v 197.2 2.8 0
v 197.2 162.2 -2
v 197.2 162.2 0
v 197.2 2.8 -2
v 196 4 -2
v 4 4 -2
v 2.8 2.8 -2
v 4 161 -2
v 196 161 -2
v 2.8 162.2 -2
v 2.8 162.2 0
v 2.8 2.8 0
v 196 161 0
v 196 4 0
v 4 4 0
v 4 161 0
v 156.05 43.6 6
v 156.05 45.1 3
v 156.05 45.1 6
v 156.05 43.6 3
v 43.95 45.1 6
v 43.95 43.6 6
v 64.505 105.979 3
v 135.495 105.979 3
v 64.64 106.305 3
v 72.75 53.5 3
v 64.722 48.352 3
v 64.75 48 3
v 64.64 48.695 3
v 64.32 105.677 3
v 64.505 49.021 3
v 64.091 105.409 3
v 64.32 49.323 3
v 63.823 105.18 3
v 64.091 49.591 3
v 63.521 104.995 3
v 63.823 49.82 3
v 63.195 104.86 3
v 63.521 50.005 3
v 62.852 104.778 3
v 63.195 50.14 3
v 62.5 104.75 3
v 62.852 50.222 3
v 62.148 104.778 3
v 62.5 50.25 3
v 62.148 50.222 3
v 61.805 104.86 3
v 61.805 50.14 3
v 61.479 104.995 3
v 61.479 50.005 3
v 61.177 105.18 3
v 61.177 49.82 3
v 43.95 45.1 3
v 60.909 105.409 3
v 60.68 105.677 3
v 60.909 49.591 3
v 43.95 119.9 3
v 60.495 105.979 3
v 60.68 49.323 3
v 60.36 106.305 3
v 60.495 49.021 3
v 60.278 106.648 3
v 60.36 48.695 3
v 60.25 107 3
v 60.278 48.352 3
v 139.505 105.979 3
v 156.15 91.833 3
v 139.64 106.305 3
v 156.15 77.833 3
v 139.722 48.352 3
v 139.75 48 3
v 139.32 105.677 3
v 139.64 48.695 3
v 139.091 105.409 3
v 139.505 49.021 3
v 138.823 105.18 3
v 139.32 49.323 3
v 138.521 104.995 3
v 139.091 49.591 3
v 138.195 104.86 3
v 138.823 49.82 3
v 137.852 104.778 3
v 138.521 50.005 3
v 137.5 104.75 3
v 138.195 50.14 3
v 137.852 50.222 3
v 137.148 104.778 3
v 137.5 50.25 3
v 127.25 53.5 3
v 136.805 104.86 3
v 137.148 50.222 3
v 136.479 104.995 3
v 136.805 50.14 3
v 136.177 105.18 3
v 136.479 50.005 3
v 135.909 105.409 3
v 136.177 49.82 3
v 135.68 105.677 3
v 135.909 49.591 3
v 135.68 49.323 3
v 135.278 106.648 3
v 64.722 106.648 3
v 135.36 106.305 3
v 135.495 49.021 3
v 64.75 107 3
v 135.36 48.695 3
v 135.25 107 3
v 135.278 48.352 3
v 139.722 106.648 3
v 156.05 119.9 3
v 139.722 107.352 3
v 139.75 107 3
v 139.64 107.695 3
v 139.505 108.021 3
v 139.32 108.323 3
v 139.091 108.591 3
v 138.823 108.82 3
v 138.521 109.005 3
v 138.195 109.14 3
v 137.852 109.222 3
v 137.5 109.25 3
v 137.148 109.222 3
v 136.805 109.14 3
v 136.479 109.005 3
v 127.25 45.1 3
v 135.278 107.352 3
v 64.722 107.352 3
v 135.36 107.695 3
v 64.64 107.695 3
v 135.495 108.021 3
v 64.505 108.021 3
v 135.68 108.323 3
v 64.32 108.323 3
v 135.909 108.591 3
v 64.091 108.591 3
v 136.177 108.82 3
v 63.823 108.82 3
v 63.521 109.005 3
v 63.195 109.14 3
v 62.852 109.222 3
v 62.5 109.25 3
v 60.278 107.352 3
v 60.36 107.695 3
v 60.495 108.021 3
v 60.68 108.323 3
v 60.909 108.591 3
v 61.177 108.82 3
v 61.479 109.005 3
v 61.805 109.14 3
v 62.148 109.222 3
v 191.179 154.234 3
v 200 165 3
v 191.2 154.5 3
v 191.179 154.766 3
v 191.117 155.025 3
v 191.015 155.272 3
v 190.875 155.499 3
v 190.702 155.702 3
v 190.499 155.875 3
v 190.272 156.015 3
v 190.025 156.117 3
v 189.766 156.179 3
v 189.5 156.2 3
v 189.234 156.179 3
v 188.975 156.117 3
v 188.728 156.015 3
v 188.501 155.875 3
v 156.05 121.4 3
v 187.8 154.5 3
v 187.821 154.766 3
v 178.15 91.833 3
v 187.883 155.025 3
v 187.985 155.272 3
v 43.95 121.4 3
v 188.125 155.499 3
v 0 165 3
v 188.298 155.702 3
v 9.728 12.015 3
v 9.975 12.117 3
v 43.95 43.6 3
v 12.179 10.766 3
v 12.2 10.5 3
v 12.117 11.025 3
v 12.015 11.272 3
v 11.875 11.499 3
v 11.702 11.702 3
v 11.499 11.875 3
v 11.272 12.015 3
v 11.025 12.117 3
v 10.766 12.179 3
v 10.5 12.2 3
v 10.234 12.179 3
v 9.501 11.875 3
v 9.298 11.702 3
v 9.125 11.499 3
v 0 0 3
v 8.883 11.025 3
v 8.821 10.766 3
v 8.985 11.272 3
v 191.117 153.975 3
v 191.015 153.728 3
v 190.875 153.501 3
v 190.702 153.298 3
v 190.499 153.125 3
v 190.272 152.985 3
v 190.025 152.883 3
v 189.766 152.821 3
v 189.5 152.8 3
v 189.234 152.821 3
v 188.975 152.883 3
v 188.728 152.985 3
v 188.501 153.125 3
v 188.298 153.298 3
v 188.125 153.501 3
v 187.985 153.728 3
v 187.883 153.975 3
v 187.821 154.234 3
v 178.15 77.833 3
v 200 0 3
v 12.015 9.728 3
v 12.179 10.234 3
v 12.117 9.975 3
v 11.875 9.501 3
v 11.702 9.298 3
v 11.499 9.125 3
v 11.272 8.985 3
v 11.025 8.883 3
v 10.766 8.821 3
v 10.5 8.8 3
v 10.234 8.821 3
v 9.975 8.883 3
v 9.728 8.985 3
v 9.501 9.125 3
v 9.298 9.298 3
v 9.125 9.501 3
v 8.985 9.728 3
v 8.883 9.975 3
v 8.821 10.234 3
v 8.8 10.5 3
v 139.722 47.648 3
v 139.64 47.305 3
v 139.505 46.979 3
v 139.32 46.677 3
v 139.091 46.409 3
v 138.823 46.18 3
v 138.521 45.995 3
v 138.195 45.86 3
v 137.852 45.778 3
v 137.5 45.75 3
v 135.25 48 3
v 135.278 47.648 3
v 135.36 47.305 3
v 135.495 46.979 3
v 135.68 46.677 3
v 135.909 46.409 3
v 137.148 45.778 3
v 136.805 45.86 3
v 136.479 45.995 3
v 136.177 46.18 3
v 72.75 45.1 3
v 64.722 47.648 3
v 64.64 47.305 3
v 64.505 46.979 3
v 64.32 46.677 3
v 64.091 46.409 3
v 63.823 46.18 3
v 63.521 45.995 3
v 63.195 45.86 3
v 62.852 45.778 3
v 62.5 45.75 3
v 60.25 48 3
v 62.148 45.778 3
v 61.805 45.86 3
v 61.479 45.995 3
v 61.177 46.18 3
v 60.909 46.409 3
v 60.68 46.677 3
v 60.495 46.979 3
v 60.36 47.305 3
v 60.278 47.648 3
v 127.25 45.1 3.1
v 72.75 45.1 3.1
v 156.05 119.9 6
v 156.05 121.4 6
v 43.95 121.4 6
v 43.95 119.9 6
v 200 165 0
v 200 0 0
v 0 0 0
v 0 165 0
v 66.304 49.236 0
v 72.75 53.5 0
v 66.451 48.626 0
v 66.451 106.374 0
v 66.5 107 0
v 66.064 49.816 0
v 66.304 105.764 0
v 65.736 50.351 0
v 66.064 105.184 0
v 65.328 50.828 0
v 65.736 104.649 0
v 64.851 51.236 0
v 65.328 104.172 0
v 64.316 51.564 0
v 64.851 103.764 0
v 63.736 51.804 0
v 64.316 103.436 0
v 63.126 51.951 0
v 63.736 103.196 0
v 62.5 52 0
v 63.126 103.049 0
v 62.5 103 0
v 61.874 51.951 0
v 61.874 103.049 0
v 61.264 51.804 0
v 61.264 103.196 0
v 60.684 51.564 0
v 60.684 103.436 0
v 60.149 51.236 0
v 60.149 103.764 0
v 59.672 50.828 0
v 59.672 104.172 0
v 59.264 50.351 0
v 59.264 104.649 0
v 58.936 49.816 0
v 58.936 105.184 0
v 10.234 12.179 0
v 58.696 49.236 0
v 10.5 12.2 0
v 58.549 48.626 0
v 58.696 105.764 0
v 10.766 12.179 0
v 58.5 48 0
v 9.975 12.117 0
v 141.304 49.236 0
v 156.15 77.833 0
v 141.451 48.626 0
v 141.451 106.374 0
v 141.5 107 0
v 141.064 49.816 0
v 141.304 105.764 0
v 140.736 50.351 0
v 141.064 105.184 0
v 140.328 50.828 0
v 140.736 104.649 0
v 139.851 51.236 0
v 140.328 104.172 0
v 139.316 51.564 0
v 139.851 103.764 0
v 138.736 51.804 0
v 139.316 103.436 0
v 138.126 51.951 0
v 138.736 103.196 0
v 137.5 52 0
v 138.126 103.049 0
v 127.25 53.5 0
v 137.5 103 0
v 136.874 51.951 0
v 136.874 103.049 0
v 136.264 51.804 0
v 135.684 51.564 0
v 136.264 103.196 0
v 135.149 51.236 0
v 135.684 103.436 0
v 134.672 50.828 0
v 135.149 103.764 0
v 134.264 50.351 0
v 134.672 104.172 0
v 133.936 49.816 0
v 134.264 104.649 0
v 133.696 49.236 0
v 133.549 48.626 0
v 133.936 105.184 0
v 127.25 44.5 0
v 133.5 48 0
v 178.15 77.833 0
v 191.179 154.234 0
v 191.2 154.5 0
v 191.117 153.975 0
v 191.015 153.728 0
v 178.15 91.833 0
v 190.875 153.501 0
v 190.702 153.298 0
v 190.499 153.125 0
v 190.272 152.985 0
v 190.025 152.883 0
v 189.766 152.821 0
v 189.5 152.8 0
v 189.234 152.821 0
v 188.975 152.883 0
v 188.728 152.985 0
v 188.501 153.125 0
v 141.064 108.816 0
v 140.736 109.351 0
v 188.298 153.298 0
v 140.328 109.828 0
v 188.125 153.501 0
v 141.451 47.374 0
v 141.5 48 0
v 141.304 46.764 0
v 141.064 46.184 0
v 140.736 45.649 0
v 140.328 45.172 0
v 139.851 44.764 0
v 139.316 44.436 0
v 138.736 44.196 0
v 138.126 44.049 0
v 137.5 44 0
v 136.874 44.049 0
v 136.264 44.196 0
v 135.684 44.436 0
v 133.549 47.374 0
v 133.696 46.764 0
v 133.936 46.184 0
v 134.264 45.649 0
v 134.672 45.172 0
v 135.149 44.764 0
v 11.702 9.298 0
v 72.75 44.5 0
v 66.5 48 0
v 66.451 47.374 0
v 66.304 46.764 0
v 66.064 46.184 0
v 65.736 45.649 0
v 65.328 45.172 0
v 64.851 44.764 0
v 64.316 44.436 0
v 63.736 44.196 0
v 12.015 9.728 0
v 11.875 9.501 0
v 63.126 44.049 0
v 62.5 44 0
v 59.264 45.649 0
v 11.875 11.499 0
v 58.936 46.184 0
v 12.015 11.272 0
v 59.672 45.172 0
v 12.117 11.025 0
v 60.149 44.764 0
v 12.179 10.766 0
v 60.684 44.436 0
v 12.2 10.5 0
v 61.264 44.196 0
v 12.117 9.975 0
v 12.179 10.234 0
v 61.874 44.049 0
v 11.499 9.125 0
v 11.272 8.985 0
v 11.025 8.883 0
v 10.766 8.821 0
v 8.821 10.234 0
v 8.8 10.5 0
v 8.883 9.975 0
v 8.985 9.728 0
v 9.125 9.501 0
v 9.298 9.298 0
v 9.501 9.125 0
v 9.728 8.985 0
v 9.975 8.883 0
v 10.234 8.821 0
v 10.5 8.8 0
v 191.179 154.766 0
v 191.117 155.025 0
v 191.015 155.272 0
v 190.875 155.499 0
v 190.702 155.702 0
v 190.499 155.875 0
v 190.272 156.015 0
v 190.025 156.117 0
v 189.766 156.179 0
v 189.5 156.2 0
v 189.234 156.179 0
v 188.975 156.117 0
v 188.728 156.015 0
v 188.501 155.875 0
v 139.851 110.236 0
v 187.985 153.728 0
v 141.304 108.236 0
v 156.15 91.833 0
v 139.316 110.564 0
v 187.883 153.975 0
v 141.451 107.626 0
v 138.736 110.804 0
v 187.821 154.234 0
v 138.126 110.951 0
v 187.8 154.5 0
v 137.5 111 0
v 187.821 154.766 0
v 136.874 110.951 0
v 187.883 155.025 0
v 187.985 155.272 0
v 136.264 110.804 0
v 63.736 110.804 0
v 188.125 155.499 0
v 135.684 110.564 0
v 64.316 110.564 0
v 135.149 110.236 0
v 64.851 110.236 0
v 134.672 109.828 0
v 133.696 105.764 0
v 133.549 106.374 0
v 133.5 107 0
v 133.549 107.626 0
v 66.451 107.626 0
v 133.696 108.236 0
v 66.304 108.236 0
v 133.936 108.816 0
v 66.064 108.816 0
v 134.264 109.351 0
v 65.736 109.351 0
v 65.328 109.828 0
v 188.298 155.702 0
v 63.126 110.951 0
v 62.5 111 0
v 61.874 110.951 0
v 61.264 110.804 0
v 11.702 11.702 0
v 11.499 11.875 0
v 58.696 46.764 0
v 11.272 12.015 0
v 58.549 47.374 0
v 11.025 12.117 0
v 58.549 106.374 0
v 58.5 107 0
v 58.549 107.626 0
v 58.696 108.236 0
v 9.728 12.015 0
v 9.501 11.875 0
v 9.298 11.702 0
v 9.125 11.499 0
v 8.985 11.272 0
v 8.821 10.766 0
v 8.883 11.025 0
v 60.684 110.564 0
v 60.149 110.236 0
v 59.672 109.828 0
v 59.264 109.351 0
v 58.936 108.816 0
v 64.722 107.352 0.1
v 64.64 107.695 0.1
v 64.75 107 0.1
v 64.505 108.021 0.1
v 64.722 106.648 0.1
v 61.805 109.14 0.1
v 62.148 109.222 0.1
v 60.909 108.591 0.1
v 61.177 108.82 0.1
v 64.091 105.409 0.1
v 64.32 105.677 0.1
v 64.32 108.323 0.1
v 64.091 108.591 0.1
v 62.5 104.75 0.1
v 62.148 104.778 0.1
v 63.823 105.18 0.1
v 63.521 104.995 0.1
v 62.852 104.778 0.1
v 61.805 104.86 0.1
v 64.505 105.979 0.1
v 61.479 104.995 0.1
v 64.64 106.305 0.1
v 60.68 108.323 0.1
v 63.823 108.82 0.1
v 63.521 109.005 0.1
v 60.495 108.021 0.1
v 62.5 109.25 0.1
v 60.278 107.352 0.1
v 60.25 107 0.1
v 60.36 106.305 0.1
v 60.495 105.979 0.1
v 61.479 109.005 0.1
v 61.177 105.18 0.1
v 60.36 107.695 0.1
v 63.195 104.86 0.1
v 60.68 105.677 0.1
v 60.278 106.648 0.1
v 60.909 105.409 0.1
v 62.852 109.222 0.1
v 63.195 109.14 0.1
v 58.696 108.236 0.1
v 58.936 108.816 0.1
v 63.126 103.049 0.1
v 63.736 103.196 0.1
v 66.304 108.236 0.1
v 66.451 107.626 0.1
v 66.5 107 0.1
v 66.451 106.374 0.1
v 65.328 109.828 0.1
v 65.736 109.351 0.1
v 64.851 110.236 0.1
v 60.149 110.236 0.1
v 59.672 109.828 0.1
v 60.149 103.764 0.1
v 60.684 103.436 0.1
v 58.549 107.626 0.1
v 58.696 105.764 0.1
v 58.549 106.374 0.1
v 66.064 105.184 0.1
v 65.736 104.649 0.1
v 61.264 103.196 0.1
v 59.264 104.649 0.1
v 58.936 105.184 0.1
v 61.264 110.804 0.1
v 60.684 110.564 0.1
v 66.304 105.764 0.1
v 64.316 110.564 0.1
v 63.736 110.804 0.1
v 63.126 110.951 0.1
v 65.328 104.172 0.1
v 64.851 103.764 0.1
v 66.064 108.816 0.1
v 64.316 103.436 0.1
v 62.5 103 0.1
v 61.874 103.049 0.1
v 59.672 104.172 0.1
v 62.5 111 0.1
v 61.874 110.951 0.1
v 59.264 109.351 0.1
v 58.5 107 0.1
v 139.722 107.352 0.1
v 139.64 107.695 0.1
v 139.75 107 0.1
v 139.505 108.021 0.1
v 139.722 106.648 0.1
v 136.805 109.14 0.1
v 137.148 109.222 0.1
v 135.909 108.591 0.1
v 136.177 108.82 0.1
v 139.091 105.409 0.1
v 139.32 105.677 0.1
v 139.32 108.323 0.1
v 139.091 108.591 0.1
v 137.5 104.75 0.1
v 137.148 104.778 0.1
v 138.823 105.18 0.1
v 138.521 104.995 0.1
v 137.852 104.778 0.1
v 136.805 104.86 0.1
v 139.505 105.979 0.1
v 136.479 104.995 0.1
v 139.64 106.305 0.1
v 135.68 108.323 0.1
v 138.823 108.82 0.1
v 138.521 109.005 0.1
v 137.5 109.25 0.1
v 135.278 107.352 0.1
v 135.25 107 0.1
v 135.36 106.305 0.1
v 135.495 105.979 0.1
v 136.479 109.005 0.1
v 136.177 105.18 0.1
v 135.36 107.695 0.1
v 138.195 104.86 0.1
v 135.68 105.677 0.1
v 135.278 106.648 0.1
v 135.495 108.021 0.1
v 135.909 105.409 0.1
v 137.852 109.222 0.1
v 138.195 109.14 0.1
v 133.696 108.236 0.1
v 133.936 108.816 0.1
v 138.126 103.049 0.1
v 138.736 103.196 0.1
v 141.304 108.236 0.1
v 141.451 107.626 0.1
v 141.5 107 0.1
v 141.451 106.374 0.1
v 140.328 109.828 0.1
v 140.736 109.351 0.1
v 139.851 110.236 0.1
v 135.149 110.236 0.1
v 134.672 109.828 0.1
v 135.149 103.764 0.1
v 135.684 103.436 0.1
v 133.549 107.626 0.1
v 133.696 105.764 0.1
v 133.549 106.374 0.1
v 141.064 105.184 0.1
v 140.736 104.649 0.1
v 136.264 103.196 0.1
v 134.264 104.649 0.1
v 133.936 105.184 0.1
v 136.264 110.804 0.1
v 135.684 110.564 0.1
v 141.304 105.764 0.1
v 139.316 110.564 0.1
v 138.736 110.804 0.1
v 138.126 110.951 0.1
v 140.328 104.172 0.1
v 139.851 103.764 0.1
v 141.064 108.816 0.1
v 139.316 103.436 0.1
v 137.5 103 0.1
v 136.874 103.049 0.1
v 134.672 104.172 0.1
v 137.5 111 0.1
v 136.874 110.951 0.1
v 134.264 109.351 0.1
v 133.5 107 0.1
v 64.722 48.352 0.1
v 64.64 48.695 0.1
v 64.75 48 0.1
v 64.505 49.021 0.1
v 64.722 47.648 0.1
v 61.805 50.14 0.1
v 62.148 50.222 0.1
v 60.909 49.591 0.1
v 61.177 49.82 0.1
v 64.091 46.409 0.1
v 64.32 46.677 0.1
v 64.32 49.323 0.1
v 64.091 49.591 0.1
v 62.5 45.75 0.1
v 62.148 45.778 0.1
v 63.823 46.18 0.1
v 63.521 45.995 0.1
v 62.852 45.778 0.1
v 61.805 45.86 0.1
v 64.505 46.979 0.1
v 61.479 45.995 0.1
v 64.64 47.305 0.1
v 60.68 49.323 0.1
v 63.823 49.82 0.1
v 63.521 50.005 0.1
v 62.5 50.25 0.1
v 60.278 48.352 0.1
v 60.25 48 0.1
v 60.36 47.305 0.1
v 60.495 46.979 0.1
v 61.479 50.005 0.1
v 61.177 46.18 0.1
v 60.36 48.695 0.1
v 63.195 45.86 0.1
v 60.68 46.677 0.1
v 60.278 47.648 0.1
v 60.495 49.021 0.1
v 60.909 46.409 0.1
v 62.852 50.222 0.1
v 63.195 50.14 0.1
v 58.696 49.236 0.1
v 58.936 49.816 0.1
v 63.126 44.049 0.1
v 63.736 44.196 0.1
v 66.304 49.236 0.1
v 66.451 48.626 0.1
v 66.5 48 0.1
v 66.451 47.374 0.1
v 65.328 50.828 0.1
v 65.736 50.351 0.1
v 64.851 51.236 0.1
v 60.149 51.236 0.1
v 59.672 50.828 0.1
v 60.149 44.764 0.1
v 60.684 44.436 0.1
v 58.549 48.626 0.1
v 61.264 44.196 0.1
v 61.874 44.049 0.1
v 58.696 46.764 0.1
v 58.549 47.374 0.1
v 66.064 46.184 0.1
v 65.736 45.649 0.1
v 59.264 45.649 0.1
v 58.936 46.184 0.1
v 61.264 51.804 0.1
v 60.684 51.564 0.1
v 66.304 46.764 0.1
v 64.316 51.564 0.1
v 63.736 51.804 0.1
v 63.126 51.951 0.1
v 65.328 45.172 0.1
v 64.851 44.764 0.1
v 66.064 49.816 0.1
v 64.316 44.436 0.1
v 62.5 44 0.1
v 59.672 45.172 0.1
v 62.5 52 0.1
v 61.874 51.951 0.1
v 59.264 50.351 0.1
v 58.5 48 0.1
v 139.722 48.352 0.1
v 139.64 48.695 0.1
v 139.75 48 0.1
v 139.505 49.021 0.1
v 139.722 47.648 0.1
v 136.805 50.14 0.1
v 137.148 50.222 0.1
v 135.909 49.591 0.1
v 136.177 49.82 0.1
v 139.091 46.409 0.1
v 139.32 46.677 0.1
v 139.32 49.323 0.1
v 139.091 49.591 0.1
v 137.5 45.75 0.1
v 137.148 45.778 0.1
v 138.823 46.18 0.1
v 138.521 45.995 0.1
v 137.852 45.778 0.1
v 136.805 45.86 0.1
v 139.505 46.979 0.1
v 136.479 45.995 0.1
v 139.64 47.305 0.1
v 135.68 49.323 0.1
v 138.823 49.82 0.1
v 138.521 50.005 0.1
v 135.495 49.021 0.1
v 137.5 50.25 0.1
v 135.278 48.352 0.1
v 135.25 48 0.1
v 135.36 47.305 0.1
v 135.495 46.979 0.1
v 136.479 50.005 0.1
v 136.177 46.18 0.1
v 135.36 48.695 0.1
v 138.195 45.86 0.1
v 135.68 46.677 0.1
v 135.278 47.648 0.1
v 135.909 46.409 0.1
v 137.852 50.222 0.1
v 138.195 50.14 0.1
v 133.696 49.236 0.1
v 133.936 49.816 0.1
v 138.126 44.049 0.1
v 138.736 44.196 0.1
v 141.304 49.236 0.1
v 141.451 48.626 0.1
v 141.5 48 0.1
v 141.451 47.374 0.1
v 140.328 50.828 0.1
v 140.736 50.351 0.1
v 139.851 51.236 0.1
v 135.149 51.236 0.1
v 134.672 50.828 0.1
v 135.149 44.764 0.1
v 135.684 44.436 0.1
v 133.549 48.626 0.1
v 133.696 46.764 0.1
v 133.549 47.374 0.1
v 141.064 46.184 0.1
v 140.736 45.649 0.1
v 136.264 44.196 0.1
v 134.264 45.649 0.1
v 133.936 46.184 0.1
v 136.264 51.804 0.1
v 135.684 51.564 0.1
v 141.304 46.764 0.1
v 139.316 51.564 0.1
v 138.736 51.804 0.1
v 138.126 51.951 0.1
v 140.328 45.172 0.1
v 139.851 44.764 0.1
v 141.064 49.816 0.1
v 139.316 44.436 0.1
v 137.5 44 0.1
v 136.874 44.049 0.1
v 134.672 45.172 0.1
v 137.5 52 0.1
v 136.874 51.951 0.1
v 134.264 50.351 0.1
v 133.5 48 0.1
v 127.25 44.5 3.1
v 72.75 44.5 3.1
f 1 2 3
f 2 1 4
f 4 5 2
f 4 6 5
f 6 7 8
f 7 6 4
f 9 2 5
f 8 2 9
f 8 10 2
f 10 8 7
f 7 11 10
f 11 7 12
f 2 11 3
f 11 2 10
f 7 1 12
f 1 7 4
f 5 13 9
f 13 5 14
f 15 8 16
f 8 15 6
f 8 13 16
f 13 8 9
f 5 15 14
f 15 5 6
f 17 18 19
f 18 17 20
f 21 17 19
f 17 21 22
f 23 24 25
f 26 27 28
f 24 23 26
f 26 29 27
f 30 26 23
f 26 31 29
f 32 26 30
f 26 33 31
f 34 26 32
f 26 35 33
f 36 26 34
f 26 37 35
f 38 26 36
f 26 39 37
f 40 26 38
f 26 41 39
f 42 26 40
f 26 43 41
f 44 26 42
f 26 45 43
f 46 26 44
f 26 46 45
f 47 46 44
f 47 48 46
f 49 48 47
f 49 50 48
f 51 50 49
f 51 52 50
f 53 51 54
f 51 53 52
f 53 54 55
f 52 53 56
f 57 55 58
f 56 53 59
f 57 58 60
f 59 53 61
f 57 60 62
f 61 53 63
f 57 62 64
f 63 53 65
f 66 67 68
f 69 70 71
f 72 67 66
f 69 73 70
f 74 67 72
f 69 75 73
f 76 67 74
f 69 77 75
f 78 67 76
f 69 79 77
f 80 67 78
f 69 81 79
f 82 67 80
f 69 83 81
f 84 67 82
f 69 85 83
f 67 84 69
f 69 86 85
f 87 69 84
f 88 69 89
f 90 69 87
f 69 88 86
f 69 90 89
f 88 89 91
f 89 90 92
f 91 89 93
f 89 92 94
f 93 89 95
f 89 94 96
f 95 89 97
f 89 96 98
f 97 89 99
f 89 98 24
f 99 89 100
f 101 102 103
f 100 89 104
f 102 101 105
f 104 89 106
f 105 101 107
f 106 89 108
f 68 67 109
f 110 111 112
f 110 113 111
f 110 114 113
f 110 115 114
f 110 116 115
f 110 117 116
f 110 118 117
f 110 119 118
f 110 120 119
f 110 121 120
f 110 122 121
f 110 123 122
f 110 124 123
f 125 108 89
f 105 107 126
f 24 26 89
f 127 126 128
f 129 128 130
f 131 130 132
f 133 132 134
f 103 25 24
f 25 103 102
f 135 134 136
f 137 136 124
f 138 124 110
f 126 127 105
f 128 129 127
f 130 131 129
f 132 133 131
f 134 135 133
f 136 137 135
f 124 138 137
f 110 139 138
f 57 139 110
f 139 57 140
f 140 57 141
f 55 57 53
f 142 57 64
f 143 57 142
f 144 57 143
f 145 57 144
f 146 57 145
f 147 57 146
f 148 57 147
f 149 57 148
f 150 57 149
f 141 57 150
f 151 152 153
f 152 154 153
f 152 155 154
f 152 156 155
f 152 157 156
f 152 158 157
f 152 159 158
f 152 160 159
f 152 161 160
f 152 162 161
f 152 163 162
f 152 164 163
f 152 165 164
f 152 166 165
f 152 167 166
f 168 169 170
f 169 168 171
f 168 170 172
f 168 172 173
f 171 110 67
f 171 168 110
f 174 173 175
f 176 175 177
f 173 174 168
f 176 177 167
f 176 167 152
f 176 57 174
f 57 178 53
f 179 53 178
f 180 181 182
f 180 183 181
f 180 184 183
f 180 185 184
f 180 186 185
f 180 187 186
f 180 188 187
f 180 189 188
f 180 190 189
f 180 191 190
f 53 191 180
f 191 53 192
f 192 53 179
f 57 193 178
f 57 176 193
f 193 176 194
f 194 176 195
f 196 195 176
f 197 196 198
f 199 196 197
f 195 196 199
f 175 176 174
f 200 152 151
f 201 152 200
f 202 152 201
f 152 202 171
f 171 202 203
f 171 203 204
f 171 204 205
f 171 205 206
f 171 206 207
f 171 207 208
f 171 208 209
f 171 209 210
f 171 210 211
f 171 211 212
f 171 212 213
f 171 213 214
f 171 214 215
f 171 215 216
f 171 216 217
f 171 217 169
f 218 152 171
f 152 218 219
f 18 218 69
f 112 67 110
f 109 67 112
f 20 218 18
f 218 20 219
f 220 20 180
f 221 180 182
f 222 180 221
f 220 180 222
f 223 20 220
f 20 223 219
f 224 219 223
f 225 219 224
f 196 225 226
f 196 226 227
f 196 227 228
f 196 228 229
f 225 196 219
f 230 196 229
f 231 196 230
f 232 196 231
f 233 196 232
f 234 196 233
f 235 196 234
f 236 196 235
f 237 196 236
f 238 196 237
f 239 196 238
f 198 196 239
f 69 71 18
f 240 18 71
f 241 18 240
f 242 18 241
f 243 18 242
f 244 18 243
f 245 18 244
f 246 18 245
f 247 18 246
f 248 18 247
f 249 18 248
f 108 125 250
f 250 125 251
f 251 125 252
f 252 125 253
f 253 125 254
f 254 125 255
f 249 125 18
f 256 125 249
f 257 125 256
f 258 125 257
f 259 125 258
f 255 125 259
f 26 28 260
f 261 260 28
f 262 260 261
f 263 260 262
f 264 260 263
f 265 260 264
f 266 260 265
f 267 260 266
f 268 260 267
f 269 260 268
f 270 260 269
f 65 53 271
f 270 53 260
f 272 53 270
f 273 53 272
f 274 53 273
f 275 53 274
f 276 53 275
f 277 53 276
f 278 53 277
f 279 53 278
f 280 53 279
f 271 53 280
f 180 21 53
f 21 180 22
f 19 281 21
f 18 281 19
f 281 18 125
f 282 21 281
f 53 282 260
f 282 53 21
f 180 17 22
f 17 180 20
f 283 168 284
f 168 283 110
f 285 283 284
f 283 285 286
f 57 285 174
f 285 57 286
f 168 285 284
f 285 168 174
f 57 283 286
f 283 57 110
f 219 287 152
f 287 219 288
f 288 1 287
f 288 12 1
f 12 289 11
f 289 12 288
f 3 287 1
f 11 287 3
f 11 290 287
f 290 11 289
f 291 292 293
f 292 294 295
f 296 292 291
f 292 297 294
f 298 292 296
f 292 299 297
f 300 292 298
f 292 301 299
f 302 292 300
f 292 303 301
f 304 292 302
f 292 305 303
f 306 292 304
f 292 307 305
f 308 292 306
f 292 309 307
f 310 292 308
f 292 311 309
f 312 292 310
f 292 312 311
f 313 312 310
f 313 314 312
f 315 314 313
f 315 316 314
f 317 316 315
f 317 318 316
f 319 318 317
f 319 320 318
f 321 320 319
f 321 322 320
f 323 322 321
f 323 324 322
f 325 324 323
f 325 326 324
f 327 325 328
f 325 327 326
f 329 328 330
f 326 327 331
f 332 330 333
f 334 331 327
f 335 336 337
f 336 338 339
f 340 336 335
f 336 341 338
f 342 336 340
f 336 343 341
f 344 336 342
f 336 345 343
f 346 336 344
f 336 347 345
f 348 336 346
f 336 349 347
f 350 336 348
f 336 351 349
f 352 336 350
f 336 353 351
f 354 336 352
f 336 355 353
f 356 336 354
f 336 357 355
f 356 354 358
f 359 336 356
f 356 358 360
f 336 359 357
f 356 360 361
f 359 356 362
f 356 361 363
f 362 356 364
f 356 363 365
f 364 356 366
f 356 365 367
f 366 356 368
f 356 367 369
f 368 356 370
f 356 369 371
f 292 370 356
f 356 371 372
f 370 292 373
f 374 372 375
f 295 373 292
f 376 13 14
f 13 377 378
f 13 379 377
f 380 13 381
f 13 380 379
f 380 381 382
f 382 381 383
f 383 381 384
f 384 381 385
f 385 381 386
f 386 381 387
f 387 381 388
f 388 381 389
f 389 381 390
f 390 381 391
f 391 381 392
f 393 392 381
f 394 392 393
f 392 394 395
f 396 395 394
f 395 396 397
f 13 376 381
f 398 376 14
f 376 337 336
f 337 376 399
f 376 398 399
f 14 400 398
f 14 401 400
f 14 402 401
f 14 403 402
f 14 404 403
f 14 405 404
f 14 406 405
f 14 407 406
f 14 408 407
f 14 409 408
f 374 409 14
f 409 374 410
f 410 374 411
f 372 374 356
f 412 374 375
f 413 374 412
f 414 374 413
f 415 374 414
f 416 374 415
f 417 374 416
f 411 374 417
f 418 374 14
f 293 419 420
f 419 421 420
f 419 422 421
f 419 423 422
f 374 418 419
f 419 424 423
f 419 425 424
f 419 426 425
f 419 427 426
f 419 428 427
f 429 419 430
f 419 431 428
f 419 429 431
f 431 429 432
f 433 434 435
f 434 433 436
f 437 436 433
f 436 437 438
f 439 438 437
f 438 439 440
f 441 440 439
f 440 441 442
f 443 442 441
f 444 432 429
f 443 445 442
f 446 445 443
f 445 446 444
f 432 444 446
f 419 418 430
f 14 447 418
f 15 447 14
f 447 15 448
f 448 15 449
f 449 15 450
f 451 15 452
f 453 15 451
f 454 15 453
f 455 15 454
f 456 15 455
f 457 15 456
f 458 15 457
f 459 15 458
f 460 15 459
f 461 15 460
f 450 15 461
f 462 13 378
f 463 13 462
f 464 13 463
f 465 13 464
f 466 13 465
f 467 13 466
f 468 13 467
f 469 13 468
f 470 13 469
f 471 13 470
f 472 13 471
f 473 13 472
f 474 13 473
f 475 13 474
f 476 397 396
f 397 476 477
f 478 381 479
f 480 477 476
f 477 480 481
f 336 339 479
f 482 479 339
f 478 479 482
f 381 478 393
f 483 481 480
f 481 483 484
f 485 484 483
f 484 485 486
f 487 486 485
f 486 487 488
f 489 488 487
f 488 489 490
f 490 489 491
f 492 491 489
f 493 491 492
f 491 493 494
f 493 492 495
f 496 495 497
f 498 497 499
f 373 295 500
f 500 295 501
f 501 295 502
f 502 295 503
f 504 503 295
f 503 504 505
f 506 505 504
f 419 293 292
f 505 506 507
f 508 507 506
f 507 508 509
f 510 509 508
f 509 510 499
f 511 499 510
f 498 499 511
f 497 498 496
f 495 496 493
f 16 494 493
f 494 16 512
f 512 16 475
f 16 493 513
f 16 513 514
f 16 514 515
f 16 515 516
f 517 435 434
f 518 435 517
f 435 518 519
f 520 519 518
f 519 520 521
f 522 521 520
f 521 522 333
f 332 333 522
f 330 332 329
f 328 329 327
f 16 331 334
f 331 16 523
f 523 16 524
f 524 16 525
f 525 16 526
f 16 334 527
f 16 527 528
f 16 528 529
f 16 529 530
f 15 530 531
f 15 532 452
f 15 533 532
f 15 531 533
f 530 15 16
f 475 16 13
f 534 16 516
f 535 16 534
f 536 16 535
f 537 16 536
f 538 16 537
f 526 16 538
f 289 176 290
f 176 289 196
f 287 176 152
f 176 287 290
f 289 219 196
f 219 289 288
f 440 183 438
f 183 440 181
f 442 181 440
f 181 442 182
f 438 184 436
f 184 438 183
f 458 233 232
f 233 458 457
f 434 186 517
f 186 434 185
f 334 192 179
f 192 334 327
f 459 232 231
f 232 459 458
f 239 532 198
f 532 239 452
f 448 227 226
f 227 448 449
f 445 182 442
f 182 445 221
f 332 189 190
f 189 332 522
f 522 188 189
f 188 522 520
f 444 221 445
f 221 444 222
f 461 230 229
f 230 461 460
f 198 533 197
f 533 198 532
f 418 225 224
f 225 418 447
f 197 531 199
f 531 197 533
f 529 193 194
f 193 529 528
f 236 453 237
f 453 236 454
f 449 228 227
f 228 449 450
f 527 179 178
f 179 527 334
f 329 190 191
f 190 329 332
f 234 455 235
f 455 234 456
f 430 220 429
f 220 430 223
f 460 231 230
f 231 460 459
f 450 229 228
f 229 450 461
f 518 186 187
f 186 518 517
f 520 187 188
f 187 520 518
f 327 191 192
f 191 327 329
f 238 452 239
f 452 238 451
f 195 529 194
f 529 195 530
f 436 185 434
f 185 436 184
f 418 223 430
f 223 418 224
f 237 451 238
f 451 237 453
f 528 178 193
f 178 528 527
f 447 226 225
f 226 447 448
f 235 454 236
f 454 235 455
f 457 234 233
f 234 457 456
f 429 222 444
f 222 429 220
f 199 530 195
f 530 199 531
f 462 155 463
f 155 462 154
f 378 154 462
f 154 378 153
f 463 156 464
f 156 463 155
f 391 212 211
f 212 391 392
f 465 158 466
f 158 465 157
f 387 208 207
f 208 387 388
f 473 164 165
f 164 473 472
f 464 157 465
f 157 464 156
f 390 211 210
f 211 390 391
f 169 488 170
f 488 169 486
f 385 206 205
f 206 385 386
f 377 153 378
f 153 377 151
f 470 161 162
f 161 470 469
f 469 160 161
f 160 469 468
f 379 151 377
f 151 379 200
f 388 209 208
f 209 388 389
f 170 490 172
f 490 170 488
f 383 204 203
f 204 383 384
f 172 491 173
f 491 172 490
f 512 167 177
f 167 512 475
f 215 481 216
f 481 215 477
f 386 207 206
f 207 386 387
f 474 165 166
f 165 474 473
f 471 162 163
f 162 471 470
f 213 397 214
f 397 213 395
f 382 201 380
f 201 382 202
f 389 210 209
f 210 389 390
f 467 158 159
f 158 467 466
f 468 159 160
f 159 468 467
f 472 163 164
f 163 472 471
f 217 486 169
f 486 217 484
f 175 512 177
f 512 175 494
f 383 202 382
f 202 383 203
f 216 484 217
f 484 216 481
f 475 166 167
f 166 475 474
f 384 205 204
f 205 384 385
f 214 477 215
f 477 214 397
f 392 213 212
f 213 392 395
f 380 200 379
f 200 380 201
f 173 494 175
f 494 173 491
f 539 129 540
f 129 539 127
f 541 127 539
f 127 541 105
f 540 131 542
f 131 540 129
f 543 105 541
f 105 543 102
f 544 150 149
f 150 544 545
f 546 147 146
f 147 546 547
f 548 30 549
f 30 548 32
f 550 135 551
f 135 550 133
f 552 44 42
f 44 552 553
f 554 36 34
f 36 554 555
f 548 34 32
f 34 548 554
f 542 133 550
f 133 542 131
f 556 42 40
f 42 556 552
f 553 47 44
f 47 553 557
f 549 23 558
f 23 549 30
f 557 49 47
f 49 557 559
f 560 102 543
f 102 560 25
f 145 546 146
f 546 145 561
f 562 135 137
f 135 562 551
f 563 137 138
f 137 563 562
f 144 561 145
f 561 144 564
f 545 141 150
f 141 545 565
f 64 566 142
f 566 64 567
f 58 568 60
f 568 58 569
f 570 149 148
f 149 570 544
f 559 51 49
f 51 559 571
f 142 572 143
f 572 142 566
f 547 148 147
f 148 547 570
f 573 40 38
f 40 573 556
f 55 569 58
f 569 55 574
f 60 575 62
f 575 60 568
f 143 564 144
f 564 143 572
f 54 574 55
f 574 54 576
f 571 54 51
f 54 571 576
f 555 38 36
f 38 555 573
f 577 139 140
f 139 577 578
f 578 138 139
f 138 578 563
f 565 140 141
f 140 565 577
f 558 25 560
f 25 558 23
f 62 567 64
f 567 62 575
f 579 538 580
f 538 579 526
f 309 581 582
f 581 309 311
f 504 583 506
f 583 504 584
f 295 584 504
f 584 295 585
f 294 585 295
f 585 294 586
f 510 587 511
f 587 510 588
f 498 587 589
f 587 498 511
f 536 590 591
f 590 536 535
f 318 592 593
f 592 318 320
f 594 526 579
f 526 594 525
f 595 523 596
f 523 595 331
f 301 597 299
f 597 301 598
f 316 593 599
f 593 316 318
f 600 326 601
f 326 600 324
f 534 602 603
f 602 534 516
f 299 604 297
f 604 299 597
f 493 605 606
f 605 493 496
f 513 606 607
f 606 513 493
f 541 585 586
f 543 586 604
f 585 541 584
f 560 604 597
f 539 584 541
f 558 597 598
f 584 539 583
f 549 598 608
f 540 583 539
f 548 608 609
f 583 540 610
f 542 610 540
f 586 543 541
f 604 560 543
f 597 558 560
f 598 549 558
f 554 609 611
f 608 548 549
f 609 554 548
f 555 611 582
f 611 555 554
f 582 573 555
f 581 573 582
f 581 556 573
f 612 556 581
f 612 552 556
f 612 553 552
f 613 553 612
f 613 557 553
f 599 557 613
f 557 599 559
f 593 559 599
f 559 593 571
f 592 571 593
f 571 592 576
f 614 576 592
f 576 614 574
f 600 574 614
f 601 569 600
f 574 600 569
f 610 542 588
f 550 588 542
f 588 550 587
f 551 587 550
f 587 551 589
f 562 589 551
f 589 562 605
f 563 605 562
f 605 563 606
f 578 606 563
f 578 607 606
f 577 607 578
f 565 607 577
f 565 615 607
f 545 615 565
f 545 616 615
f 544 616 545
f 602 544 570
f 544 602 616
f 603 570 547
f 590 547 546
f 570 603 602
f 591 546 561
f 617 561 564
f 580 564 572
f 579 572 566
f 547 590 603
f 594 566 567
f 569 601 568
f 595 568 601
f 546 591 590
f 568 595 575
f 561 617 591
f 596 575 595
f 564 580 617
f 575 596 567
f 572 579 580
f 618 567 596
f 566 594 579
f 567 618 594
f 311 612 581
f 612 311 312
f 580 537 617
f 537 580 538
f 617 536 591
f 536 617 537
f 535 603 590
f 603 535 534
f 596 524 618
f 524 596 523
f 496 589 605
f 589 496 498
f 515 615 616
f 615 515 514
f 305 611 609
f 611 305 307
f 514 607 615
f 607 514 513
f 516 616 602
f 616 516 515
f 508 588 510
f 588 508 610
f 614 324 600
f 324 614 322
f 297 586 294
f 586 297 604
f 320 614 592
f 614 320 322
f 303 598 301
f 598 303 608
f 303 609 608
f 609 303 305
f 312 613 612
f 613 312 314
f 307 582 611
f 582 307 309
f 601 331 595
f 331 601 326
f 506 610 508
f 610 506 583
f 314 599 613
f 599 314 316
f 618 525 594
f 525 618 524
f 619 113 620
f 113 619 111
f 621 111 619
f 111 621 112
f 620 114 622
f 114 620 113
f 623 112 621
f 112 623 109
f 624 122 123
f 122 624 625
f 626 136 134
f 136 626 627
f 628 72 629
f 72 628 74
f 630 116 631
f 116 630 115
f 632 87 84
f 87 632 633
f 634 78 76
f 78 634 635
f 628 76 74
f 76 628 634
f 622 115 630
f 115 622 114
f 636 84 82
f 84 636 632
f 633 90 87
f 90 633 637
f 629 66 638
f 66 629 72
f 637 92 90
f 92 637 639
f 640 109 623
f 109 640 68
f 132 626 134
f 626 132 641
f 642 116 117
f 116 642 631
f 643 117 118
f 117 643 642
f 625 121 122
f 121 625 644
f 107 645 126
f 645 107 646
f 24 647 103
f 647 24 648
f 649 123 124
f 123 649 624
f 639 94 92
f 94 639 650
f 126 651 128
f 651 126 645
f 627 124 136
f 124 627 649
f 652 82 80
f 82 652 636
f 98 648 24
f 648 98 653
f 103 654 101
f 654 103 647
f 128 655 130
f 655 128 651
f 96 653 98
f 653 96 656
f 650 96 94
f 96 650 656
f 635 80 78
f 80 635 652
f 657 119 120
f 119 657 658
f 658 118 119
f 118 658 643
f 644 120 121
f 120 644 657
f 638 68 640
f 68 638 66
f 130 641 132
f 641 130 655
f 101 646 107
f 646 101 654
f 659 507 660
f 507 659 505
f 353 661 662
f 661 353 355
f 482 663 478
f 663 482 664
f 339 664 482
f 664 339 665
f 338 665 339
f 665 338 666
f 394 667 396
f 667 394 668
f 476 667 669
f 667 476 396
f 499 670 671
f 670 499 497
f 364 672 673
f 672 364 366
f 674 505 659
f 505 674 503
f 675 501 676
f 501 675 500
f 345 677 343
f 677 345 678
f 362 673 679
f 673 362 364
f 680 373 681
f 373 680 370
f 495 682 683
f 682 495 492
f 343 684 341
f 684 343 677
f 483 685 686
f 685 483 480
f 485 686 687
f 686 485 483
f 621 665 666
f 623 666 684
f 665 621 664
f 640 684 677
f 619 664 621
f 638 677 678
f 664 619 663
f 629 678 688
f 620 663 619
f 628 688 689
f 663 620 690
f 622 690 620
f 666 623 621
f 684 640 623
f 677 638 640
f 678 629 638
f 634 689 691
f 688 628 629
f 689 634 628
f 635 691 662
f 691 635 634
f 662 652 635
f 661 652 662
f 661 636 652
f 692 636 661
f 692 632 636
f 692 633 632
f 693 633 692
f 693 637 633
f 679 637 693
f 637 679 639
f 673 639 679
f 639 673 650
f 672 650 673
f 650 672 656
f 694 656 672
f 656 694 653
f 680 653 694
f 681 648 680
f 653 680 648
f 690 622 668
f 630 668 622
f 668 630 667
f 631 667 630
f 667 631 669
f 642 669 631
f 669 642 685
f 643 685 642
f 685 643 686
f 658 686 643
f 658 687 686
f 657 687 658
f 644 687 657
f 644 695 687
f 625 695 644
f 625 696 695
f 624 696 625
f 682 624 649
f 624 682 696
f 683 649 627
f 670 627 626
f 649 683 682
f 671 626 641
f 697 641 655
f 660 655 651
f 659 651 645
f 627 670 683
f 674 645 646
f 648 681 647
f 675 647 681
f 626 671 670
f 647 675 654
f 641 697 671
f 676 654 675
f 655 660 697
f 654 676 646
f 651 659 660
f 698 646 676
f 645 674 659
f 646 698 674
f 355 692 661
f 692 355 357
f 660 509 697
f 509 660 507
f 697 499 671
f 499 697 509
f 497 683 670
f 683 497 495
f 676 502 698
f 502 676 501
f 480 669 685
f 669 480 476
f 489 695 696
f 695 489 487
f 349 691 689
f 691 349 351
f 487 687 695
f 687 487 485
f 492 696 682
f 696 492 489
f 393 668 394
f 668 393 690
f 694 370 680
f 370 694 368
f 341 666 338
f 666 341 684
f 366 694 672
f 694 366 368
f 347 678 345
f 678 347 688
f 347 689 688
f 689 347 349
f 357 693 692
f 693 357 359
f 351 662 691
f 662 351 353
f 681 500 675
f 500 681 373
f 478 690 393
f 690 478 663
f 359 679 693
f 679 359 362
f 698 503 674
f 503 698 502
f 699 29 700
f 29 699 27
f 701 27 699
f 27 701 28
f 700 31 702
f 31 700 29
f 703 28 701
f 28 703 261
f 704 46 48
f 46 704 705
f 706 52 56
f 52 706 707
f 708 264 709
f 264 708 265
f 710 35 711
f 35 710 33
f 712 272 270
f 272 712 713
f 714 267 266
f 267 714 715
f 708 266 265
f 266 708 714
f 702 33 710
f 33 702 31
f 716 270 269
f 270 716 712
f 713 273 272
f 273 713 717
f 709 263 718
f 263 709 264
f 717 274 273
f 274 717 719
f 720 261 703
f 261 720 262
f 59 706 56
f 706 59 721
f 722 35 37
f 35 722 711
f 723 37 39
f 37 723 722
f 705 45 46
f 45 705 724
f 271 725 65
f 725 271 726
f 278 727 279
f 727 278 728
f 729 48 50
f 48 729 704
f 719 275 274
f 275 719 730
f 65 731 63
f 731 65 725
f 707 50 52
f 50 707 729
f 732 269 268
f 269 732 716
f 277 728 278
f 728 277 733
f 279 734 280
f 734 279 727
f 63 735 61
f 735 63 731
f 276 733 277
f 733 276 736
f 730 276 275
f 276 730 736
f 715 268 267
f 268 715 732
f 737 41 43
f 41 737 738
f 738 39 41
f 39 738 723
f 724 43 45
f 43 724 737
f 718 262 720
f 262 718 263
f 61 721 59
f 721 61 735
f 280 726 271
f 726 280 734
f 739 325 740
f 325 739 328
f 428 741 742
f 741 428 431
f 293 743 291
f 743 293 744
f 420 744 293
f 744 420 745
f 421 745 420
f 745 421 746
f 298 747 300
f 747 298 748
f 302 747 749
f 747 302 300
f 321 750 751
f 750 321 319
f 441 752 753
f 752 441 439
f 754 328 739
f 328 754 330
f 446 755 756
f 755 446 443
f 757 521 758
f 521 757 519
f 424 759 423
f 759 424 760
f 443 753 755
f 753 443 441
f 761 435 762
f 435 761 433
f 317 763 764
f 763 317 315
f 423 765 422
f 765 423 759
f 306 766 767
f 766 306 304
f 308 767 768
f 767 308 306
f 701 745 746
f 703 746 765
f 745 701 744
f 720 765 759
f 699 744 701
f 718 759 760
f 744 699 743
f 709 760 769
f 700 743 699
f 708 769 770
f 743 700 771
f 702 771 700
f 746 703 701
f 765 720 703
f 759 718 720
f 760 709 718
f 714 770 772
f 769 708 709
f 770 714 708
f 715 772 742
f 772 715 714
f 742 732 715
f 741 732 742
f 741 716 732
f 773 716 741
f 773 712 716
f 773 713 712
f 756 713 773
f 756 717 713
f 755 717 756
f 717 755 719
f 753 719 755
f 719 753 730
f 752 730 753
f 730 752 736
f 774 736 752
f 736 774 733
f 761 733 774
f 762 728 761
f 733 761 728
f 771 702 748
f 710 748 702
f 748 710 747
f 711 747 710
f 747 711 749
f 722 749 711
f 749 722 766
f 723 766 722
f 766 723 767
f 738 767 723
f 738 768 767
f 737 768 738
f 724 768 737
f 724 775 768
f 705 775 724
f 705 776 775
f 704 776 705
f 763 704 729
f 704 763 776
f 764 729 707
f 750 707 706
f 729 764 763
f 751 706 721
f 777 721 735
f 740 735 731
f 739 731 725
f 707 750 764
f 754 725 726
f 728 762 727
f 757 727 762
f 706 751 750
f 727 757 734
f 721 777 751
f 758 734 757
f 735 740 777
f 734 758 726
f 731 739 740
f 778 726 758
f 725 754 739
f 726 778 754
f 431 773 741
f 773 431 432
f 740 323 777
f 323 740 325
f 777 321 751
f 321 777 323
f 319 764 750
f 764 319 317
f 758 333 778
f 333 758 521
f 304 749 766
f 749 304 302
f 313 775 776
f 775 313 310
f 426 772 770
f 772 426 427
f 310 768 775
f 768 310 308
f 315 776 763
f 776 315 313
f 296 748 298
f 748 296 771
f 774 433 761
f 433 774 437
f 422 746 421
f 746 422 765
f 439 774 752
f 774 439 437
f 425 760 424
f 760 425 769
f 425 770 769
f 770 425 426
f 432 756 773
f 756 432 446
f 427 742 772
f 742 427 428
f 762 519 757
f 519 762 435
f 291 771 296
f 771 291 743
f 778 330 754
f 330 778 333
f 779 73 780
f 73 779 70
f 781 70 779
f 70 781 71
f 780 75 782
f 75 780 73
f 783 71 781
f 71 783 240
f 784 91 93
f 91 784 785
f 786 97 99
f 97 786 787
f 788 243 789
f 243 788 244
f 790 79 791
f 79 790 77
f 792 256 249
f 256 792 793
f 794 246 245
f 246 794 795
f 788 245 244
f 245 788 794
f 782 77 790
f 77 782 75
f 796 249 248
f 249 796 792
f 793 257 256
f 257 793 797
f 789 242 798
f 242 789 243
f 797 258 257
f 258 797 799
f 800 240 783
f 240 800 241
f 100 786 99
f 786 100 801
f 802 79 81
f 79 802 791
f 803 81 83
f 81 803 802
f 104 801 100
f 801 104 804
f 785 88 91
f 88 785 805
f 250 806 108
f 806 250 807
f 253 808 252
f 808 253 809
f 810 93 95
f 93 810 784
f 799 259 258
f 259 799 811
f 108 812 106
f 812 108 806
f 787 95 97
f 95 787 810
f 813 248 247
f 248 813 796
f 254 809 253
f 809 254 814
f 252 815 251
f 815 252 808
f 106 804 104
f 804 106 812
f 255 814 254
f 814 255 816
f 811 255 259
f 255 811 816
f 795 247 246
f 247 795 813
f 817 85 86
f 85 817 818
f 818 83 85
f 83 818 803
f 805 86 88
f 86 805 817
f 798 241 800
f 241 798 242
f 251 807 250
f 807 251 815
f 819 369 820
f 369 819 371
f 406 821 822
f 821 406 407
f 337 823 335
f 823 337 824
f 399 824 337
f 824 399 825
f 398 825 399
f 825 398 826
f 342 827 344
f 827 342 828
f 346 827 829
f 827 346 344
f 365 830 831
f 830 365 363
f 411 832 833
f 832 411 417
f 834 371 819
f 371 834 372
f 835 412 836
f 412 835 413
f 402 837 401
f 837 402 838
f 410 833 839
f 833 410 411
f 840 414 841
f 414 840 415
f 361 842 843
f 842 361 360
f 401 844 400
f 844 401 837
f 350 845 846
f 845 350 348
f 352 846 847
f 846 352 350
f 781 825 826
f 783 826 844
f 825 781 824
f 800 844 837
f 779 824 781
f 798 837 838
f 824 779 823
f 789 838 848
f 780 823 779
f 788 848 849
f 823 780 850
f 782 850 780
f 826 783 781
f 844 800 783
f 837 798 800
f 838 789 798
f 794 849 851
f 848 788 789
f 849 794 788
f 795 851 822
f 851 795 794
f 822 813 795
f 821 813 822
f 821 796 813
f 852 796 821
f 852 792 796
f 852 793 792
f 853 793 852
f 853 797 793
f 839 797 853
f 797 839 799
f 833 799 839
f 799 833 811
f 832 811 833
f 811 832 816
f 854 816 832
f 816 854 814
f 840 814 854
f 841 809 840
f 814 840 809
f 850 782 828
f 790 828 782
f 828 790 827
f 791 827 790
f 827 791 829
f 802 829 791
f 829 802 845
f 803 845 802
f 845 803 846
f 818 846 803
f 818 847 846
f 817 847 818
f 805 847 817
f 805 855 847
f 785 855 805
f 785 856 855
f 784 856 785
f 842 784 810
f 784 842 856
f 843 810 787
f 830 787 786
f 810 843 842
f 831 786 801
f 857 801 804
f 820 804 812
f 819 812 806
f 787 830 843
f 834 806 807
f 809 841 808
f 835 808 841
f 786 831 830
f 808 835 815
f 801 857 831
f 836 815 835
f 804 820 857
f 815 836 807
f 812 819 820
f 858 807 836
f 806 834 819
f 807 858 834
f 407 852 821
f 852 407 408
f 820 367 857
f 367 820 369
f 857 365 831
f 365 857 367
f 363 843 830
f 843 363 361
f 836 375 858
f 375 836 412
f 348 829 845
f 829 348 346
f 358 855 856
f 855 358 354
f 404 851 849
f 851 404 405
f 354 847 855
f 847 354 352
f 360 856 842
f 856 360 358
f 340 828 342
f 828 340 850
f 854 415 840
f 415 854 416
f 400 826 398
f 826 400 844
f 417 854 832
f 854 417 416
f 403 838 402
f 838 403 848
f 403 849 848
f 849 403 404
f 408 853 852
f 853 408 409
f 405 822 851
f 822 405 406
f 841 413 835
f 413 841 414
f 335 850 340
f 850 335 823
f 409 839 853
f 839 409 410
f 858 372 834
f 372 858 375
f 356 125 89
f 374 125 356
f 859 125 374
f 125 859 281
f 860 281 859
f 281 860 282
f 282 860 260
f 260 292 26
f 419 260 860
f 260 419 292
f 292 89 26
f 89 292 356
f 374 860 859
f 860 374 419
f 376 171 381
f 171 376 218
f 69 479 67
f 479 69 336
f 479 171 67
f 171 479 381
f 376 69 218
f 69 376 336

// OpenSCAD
// =============================================================================
// DOA Flat Enclosure - LID (Waveshare 4.3B BOX — M4 Surface Mount)
// =============================================================================
//
// DESIGN 2: M4 screw-through surface mount (flat-printable, no supports)
//
// Mates with doa_enclosure_body.scad (same lip/boss geometry as original lid).
// The Waveshare 4.3B BOX sits directly on the lid TOP surface (glass up).
// Four M4 screws from inside the enclosure pass through the lid and thread
// into the BOX's brass M4 inserts (75 x 59 mm pattern on the back panel).
// A relief slot lets the terminal block drop through the lid instead of
// needing standoffs (keeps the lid fully flat and support-free).
// A USB cable slit routes the cable into the enclosure.
//
// Print orientation: top face DOWN on bed (best surface finish for visible
// face). Registration walls and lip print upward — no supports needed.
// =============================================================================

$fn = 40;

// =============================================================================
// BODY-DERIVED CONSTANTS  --  keep in sync with doa_enclosure_body.scad
// =============================================================================

wall       = 2.5;
interior_w = 195;
interior_d = 160;
interior_h = 52;

enc_w = interior_w + 2*wall;    // 200 mm
enc_d = interior_d + 2*wall;    // 165 mm

ledge_drop = 2;

lid_boss_pos = [
    [8,                8],                  // front-left
    [interior_w - 8,   interior_d - 8]      // back-right
];
m3_clear_d = 3.4;

// =============================================================================
// LID GEOMETRY
// =============================================================================

lid_t   = 3.0;
lip_t   = 1.2;
lip_clr = 0.3;
lip_h   = ledge_drop;

// =============================================================================
// WAVESHARE ESP32-S3-TOUCH-LCD-4.3B  BOX  PARAMETERS
// (same parameter block as Design 1 — keep in sync)
// =============================================================================

box_front_w = 116.30;
box_front_h =  79.00;
box_body_w  = 111.30;
box_body_h  =  74.00;

box_lip_step = (box_front_w - box_body_w) / 2;   // 2.50 mm

box_depth = 18.00;

box_active_w   =  95.54;
box_active_h   =  54.36;
box_active_x   =  10.38;
box_active_y_top = 10.38;

// M4 mounting holes — positions relative to front face bottom-left corner.
// Back panel is inset by box_lip_step horizontally. Holes are centered
// horizontally on the back panel. Vertically: top holes 15mm from top,
// bottom holes 74mm from top (of the 79mm front face).
// NOTE: verify these positions with calipers on your unit.
box_m4_h_spacing = 75.00;
box_m4_v_spacing = 59.00;

box_m4_holes = [
    [(box_front_w - box_m4_h_spacing)/2, box_front_h - 15.00],  // top-left
    [(box_front_w + box_m4_h_spacing)/2, box_front_h - 15.00],  // top-right
    [(box_front_w - box_m4_h_spacing)/2, box_front_h - 74.00],  // bottom-left
    [(box_front_w + box_m4_h_spacing)/2, box_front_h - 74.00],  // bottom-right
];

m4_clear_d   = 4.5;    // M4 clearance hole
m4_cbore_d   = 8.0;    // M4 counterbore diameter (cap head)
m4_cbore_h   = 3.5;    // counterbore depth (underside of lid)

// Terminal block relief slot — the terminal block protrudes 3.50 mm from the
// BOX back and would prevent the BOX from sitting flat. Instead of standoffs,
// we cut a slot through the lid and let the block drop through. Zero supports.
term_block_w       = 52.50;    // terminal block width
term_block_depth   =  8.00;    // slot depth (Y direction, generous clearance)
term_block_clr     =  1.00;    // clearance around block

// USB-C port
usb_c_from_back = box_depth - 2.50;
usb_c_port_w    = 10.0;

// =============================================================================
// BOX PLACEMENT ON LID
// =============================================================================
// BOX sits on lid surface (back face down, glass up).
// Centered on lid. USB-C faces right (high-X).

box_center_x = enc_w / 2;
box_center_y = enc_d / 2;

box_origin_x = box_center_x - box_front_w / 2;
box_origin_y = box_center_y - box_front_h / 2;

// =============================================================================
// USB CABLE SLIT
// =============================================================================
// Through-lid slit on the USB side (right). The USB-C port is on the
// short edge of the BOX, above the lid surface. This slit lets the
// cable drop through the lid into the enclosure.

usb_slit_w     = 14.0;
usb_slit_len   = 20.0;    // how far the slit extends from BOX edge toward lid edge
usb_slit_y     = box_center_y;

// =============================================================================
// REGISTRATION FRAME
// =============================================================================
// Low walls on the lid surface that cradle the BOX back panel, preventing
// lateral sliding. Runs along the long edges of the BOX (leaving short
// edges open for USB access and terminal block clearance).

reg_wall_h = 3.0;    // height of registration wall
reg_wall_t = 1.5;    // thickness
reg_clr    = 0.4;    // clearance to BOX body

// =============================================================================
// RENDER
// =============================================================================

difference() {
    union() {
        top_plate();
        lid_lip();
        registration_walls();
    }
    body_corner_clearances();
    m4_through_holes();
    terminal_block_slot();
    usb_cable_slit();
}

// Uncomment to visualize display placement:
// %preview_box();

// =============================================================================
// MODULES
// =============================================================================

module top_plate() {
    cube([enc_w, enc_d, lid_t]);
}

module lid_lip() {
    lip_outer_w = interior_w - 2*lip_clr;
    lip_outer_d = interior_d - 2*lip_clr;
    translate([wall + lip_clr, wall + lip_clr, -lip_h])
    difference() {
        cube([lip_outer_w, lip_outer_d, lip_h + 0.01]);
        translate([lip_t, lip_t, -0.1])
            cube([lip_outer_w - 2*lip_t,
                  lip_outer_d - 2*lip_t,
                  lip_h + 0.3]);
    }
}

module body_corner_clearances() {
    for (pos = lid_boss_pos) {
        translate([wall + pos[0], wall + pos[1], -0.1])
            cylinder(d=m3_clear_d, h=lid_t + 0.2);
    }
}

// M4 clearance holes straight through the 3mm lid.
// Counterbore on underside for M4 cap head screw.
// BOX back sits flat on the lid — no standoffs needed.
module m4_through_holes() {
    for (hole = box_m4_holes) {
        hx = box_origin_x + hole[0];
        hy = box_origin_y + hole[1];

        // Clearance hole through lid
        translate([hx, hy, -0.1])
            cylinder(d=m4_clear_d, h=lid_t + 0.2);

        // Counterbore on lid underside for screw head
        translate([hx, hy, -m4_cbore_h])
            cylinder(d=m4_cbore_d, h=m4_cbore_h + 0.1);
    }
}

// Relief slot for the terminal block — cuts through the full lid thickness.
// The terminal block (52.50mm wide, bottom edge of BOX back) drops through
// this slot so the rest of the BOX back sits flat on the lid surface.
module terminal_block_slot() {
    // Terminal block is centered on the BOX width, at the bottom edge
    // of the back panel (low-Y side when BOX origin is bottom-left).
    slot_w = term_block_w + 2*term_block_clr;
    slot_d = term_block_depth + term_block_clr;

    slot_x = box_origin_x + box_front_w/2 - slot_w/2;
    // Bottom edge of body (back panel) — the terminal block is here
    slot_y = box_origin_y + box_lip_step - term_block_clr;

    translate([slot_x, slot_y, -0.1])
        cube([slot_w, slot_d, lid_t + 0.2]);
}

// Low walls along the long (X) edges of the BOX body to prevent lateral
// sliding. BOX back sits flat on the lid surface between these walls.
// Short edges left open for USB access (right) and terminal block slot (left).
module registration_walls() {
    body_x = box_origin_x + box_lip_step;
    body_y = box_origin_y + box_lip_step;

    reg_len = box_body_w + 2*reg_clr;

    for (side = [0, 1]) {
        y_pos = (side == 0)
            ? body_y - reg_clr - reg_wall_t
            : body_y + box_body_h + reg_clr;
        translate([body_x - reg_clr, y_pos, lid_t])
            cube([reg_len, reg_wall_t, reg_wall_h]);
    }
}

// Through-lid slit for USB cable routing.
// Located on the right short edge of the BOX.
module usb_cable_slit() {
    slit_x_start = box_origin_x + box_front_w;
    translate([slit_x_start - 2,
               usb_slit_y - usb_slit_w/3,
               -0.1])
        cube([usb_slit_len + 2,
              usb_slit_w,
              lid_t + 0.2]);
}

// =============================================================================
// PREVIEW
// =============================================================================

module preview_box() {
    box_z = lid_t;   // BOX back sits directly on lid surface

    // Back panel / body (black)
    color("black", 0.4)
    translate([box_origin_x + box_lip_step,
               box_origin_y + box_lip_step,
               box_z])
        cube([box_body_w, box_body_h, box_depth - box_lip_step]);

    // Front face / glass bezel (dark grey, on top)
    color("dimgrey", 0.6)
    translate([box_origin_x,
               box_origin_y,
               box_z + box_depth - box_lip_step])
        cube([box_front_w, box_front_h, box_lip_step]);

    // Active area (green)
    color("lime", 0.7)
    translate([box_origin_x + box_active_x,
               box_origin_y + (box_front_h - box_active_y_top - box_active_h),
               box_z + box_depth + 0.1])
        cube([box_active_w, box_active_h, 0.3]);

    // USB-C port indicator (red, right side)
    color("red", 0.8)
    translate([box_origin_x + box_front_w - 0.1,
               box_center_y - 4.5,
               box_z + box_depth - 2.50 - 1.75])
        cube([5, 9, 3.5]);

    // M4 screw indicators (gold)
    color("gold")
    for (hole = box_m4_holes) {
        translate([box_origin_x + hole[0],
                   box_origin_y + hole[1],
                   box_z - 0.1])
            cylinder(d=6, h=2);
    }

    // Terminal block indicator (drops through slot, green)
    color("darkgreen", 0.6)
    translate([box_origin_x + box_front_w/2 - 52.50/2,
               box_origin_y + box_lip_step,
               box_z - 3.50])
        cube([52.50, 3.50, 3.50]);
}

// =============================================================================
// DIMENSION CHECKS
// =============================================================================

echo("==========================================================");
echo("DOA FLAT ENCLOSURE - LID (4.3B BOX M4 SURFACE MOUNT)");
echo("==========================================================");
echo(str("Lid outer: ", enc_w, " x ", enc_d, " x ", lid_t, " mm"));
echo(str("BOX front face: ", box_front_w, " x ", box_front_h, " mm"));
echo(str("BOX sits flat on lid — no standoffs"));
echo(str("M4 pattern: ", box_m4_h_spacing, " x ", box_m4_v_spacing, " mm"));
echo(str("Terminal block slot: ", term_block_w + 2*term_block_clr,
    " x ", term_block_depth + term_block_clr, " mm (through lid)"));
echo(str("USB slit: ", usb_slit_w, " x ", usb_slit_len, " mm, right side"));
echo(str("BOX top surface Z: ", lid_t + box_depth, " mm above lid bottom"));
echo(str("Counterbore: ", m4_cbore_d, " dia x ", m4_cbore_h, " deep (underside)"));
echo(str("M4 holes at:"));
for (i = [0:3])
    echo(str("  [", box_m4_holes[i][0], ", ", box_m4_holes[i][1],
        "] -> lid coords [",
        box_origin_x + box_m4_holes[i][0], ", ",
        box_origin_y + box_m4_holes[i][1], "]"));
